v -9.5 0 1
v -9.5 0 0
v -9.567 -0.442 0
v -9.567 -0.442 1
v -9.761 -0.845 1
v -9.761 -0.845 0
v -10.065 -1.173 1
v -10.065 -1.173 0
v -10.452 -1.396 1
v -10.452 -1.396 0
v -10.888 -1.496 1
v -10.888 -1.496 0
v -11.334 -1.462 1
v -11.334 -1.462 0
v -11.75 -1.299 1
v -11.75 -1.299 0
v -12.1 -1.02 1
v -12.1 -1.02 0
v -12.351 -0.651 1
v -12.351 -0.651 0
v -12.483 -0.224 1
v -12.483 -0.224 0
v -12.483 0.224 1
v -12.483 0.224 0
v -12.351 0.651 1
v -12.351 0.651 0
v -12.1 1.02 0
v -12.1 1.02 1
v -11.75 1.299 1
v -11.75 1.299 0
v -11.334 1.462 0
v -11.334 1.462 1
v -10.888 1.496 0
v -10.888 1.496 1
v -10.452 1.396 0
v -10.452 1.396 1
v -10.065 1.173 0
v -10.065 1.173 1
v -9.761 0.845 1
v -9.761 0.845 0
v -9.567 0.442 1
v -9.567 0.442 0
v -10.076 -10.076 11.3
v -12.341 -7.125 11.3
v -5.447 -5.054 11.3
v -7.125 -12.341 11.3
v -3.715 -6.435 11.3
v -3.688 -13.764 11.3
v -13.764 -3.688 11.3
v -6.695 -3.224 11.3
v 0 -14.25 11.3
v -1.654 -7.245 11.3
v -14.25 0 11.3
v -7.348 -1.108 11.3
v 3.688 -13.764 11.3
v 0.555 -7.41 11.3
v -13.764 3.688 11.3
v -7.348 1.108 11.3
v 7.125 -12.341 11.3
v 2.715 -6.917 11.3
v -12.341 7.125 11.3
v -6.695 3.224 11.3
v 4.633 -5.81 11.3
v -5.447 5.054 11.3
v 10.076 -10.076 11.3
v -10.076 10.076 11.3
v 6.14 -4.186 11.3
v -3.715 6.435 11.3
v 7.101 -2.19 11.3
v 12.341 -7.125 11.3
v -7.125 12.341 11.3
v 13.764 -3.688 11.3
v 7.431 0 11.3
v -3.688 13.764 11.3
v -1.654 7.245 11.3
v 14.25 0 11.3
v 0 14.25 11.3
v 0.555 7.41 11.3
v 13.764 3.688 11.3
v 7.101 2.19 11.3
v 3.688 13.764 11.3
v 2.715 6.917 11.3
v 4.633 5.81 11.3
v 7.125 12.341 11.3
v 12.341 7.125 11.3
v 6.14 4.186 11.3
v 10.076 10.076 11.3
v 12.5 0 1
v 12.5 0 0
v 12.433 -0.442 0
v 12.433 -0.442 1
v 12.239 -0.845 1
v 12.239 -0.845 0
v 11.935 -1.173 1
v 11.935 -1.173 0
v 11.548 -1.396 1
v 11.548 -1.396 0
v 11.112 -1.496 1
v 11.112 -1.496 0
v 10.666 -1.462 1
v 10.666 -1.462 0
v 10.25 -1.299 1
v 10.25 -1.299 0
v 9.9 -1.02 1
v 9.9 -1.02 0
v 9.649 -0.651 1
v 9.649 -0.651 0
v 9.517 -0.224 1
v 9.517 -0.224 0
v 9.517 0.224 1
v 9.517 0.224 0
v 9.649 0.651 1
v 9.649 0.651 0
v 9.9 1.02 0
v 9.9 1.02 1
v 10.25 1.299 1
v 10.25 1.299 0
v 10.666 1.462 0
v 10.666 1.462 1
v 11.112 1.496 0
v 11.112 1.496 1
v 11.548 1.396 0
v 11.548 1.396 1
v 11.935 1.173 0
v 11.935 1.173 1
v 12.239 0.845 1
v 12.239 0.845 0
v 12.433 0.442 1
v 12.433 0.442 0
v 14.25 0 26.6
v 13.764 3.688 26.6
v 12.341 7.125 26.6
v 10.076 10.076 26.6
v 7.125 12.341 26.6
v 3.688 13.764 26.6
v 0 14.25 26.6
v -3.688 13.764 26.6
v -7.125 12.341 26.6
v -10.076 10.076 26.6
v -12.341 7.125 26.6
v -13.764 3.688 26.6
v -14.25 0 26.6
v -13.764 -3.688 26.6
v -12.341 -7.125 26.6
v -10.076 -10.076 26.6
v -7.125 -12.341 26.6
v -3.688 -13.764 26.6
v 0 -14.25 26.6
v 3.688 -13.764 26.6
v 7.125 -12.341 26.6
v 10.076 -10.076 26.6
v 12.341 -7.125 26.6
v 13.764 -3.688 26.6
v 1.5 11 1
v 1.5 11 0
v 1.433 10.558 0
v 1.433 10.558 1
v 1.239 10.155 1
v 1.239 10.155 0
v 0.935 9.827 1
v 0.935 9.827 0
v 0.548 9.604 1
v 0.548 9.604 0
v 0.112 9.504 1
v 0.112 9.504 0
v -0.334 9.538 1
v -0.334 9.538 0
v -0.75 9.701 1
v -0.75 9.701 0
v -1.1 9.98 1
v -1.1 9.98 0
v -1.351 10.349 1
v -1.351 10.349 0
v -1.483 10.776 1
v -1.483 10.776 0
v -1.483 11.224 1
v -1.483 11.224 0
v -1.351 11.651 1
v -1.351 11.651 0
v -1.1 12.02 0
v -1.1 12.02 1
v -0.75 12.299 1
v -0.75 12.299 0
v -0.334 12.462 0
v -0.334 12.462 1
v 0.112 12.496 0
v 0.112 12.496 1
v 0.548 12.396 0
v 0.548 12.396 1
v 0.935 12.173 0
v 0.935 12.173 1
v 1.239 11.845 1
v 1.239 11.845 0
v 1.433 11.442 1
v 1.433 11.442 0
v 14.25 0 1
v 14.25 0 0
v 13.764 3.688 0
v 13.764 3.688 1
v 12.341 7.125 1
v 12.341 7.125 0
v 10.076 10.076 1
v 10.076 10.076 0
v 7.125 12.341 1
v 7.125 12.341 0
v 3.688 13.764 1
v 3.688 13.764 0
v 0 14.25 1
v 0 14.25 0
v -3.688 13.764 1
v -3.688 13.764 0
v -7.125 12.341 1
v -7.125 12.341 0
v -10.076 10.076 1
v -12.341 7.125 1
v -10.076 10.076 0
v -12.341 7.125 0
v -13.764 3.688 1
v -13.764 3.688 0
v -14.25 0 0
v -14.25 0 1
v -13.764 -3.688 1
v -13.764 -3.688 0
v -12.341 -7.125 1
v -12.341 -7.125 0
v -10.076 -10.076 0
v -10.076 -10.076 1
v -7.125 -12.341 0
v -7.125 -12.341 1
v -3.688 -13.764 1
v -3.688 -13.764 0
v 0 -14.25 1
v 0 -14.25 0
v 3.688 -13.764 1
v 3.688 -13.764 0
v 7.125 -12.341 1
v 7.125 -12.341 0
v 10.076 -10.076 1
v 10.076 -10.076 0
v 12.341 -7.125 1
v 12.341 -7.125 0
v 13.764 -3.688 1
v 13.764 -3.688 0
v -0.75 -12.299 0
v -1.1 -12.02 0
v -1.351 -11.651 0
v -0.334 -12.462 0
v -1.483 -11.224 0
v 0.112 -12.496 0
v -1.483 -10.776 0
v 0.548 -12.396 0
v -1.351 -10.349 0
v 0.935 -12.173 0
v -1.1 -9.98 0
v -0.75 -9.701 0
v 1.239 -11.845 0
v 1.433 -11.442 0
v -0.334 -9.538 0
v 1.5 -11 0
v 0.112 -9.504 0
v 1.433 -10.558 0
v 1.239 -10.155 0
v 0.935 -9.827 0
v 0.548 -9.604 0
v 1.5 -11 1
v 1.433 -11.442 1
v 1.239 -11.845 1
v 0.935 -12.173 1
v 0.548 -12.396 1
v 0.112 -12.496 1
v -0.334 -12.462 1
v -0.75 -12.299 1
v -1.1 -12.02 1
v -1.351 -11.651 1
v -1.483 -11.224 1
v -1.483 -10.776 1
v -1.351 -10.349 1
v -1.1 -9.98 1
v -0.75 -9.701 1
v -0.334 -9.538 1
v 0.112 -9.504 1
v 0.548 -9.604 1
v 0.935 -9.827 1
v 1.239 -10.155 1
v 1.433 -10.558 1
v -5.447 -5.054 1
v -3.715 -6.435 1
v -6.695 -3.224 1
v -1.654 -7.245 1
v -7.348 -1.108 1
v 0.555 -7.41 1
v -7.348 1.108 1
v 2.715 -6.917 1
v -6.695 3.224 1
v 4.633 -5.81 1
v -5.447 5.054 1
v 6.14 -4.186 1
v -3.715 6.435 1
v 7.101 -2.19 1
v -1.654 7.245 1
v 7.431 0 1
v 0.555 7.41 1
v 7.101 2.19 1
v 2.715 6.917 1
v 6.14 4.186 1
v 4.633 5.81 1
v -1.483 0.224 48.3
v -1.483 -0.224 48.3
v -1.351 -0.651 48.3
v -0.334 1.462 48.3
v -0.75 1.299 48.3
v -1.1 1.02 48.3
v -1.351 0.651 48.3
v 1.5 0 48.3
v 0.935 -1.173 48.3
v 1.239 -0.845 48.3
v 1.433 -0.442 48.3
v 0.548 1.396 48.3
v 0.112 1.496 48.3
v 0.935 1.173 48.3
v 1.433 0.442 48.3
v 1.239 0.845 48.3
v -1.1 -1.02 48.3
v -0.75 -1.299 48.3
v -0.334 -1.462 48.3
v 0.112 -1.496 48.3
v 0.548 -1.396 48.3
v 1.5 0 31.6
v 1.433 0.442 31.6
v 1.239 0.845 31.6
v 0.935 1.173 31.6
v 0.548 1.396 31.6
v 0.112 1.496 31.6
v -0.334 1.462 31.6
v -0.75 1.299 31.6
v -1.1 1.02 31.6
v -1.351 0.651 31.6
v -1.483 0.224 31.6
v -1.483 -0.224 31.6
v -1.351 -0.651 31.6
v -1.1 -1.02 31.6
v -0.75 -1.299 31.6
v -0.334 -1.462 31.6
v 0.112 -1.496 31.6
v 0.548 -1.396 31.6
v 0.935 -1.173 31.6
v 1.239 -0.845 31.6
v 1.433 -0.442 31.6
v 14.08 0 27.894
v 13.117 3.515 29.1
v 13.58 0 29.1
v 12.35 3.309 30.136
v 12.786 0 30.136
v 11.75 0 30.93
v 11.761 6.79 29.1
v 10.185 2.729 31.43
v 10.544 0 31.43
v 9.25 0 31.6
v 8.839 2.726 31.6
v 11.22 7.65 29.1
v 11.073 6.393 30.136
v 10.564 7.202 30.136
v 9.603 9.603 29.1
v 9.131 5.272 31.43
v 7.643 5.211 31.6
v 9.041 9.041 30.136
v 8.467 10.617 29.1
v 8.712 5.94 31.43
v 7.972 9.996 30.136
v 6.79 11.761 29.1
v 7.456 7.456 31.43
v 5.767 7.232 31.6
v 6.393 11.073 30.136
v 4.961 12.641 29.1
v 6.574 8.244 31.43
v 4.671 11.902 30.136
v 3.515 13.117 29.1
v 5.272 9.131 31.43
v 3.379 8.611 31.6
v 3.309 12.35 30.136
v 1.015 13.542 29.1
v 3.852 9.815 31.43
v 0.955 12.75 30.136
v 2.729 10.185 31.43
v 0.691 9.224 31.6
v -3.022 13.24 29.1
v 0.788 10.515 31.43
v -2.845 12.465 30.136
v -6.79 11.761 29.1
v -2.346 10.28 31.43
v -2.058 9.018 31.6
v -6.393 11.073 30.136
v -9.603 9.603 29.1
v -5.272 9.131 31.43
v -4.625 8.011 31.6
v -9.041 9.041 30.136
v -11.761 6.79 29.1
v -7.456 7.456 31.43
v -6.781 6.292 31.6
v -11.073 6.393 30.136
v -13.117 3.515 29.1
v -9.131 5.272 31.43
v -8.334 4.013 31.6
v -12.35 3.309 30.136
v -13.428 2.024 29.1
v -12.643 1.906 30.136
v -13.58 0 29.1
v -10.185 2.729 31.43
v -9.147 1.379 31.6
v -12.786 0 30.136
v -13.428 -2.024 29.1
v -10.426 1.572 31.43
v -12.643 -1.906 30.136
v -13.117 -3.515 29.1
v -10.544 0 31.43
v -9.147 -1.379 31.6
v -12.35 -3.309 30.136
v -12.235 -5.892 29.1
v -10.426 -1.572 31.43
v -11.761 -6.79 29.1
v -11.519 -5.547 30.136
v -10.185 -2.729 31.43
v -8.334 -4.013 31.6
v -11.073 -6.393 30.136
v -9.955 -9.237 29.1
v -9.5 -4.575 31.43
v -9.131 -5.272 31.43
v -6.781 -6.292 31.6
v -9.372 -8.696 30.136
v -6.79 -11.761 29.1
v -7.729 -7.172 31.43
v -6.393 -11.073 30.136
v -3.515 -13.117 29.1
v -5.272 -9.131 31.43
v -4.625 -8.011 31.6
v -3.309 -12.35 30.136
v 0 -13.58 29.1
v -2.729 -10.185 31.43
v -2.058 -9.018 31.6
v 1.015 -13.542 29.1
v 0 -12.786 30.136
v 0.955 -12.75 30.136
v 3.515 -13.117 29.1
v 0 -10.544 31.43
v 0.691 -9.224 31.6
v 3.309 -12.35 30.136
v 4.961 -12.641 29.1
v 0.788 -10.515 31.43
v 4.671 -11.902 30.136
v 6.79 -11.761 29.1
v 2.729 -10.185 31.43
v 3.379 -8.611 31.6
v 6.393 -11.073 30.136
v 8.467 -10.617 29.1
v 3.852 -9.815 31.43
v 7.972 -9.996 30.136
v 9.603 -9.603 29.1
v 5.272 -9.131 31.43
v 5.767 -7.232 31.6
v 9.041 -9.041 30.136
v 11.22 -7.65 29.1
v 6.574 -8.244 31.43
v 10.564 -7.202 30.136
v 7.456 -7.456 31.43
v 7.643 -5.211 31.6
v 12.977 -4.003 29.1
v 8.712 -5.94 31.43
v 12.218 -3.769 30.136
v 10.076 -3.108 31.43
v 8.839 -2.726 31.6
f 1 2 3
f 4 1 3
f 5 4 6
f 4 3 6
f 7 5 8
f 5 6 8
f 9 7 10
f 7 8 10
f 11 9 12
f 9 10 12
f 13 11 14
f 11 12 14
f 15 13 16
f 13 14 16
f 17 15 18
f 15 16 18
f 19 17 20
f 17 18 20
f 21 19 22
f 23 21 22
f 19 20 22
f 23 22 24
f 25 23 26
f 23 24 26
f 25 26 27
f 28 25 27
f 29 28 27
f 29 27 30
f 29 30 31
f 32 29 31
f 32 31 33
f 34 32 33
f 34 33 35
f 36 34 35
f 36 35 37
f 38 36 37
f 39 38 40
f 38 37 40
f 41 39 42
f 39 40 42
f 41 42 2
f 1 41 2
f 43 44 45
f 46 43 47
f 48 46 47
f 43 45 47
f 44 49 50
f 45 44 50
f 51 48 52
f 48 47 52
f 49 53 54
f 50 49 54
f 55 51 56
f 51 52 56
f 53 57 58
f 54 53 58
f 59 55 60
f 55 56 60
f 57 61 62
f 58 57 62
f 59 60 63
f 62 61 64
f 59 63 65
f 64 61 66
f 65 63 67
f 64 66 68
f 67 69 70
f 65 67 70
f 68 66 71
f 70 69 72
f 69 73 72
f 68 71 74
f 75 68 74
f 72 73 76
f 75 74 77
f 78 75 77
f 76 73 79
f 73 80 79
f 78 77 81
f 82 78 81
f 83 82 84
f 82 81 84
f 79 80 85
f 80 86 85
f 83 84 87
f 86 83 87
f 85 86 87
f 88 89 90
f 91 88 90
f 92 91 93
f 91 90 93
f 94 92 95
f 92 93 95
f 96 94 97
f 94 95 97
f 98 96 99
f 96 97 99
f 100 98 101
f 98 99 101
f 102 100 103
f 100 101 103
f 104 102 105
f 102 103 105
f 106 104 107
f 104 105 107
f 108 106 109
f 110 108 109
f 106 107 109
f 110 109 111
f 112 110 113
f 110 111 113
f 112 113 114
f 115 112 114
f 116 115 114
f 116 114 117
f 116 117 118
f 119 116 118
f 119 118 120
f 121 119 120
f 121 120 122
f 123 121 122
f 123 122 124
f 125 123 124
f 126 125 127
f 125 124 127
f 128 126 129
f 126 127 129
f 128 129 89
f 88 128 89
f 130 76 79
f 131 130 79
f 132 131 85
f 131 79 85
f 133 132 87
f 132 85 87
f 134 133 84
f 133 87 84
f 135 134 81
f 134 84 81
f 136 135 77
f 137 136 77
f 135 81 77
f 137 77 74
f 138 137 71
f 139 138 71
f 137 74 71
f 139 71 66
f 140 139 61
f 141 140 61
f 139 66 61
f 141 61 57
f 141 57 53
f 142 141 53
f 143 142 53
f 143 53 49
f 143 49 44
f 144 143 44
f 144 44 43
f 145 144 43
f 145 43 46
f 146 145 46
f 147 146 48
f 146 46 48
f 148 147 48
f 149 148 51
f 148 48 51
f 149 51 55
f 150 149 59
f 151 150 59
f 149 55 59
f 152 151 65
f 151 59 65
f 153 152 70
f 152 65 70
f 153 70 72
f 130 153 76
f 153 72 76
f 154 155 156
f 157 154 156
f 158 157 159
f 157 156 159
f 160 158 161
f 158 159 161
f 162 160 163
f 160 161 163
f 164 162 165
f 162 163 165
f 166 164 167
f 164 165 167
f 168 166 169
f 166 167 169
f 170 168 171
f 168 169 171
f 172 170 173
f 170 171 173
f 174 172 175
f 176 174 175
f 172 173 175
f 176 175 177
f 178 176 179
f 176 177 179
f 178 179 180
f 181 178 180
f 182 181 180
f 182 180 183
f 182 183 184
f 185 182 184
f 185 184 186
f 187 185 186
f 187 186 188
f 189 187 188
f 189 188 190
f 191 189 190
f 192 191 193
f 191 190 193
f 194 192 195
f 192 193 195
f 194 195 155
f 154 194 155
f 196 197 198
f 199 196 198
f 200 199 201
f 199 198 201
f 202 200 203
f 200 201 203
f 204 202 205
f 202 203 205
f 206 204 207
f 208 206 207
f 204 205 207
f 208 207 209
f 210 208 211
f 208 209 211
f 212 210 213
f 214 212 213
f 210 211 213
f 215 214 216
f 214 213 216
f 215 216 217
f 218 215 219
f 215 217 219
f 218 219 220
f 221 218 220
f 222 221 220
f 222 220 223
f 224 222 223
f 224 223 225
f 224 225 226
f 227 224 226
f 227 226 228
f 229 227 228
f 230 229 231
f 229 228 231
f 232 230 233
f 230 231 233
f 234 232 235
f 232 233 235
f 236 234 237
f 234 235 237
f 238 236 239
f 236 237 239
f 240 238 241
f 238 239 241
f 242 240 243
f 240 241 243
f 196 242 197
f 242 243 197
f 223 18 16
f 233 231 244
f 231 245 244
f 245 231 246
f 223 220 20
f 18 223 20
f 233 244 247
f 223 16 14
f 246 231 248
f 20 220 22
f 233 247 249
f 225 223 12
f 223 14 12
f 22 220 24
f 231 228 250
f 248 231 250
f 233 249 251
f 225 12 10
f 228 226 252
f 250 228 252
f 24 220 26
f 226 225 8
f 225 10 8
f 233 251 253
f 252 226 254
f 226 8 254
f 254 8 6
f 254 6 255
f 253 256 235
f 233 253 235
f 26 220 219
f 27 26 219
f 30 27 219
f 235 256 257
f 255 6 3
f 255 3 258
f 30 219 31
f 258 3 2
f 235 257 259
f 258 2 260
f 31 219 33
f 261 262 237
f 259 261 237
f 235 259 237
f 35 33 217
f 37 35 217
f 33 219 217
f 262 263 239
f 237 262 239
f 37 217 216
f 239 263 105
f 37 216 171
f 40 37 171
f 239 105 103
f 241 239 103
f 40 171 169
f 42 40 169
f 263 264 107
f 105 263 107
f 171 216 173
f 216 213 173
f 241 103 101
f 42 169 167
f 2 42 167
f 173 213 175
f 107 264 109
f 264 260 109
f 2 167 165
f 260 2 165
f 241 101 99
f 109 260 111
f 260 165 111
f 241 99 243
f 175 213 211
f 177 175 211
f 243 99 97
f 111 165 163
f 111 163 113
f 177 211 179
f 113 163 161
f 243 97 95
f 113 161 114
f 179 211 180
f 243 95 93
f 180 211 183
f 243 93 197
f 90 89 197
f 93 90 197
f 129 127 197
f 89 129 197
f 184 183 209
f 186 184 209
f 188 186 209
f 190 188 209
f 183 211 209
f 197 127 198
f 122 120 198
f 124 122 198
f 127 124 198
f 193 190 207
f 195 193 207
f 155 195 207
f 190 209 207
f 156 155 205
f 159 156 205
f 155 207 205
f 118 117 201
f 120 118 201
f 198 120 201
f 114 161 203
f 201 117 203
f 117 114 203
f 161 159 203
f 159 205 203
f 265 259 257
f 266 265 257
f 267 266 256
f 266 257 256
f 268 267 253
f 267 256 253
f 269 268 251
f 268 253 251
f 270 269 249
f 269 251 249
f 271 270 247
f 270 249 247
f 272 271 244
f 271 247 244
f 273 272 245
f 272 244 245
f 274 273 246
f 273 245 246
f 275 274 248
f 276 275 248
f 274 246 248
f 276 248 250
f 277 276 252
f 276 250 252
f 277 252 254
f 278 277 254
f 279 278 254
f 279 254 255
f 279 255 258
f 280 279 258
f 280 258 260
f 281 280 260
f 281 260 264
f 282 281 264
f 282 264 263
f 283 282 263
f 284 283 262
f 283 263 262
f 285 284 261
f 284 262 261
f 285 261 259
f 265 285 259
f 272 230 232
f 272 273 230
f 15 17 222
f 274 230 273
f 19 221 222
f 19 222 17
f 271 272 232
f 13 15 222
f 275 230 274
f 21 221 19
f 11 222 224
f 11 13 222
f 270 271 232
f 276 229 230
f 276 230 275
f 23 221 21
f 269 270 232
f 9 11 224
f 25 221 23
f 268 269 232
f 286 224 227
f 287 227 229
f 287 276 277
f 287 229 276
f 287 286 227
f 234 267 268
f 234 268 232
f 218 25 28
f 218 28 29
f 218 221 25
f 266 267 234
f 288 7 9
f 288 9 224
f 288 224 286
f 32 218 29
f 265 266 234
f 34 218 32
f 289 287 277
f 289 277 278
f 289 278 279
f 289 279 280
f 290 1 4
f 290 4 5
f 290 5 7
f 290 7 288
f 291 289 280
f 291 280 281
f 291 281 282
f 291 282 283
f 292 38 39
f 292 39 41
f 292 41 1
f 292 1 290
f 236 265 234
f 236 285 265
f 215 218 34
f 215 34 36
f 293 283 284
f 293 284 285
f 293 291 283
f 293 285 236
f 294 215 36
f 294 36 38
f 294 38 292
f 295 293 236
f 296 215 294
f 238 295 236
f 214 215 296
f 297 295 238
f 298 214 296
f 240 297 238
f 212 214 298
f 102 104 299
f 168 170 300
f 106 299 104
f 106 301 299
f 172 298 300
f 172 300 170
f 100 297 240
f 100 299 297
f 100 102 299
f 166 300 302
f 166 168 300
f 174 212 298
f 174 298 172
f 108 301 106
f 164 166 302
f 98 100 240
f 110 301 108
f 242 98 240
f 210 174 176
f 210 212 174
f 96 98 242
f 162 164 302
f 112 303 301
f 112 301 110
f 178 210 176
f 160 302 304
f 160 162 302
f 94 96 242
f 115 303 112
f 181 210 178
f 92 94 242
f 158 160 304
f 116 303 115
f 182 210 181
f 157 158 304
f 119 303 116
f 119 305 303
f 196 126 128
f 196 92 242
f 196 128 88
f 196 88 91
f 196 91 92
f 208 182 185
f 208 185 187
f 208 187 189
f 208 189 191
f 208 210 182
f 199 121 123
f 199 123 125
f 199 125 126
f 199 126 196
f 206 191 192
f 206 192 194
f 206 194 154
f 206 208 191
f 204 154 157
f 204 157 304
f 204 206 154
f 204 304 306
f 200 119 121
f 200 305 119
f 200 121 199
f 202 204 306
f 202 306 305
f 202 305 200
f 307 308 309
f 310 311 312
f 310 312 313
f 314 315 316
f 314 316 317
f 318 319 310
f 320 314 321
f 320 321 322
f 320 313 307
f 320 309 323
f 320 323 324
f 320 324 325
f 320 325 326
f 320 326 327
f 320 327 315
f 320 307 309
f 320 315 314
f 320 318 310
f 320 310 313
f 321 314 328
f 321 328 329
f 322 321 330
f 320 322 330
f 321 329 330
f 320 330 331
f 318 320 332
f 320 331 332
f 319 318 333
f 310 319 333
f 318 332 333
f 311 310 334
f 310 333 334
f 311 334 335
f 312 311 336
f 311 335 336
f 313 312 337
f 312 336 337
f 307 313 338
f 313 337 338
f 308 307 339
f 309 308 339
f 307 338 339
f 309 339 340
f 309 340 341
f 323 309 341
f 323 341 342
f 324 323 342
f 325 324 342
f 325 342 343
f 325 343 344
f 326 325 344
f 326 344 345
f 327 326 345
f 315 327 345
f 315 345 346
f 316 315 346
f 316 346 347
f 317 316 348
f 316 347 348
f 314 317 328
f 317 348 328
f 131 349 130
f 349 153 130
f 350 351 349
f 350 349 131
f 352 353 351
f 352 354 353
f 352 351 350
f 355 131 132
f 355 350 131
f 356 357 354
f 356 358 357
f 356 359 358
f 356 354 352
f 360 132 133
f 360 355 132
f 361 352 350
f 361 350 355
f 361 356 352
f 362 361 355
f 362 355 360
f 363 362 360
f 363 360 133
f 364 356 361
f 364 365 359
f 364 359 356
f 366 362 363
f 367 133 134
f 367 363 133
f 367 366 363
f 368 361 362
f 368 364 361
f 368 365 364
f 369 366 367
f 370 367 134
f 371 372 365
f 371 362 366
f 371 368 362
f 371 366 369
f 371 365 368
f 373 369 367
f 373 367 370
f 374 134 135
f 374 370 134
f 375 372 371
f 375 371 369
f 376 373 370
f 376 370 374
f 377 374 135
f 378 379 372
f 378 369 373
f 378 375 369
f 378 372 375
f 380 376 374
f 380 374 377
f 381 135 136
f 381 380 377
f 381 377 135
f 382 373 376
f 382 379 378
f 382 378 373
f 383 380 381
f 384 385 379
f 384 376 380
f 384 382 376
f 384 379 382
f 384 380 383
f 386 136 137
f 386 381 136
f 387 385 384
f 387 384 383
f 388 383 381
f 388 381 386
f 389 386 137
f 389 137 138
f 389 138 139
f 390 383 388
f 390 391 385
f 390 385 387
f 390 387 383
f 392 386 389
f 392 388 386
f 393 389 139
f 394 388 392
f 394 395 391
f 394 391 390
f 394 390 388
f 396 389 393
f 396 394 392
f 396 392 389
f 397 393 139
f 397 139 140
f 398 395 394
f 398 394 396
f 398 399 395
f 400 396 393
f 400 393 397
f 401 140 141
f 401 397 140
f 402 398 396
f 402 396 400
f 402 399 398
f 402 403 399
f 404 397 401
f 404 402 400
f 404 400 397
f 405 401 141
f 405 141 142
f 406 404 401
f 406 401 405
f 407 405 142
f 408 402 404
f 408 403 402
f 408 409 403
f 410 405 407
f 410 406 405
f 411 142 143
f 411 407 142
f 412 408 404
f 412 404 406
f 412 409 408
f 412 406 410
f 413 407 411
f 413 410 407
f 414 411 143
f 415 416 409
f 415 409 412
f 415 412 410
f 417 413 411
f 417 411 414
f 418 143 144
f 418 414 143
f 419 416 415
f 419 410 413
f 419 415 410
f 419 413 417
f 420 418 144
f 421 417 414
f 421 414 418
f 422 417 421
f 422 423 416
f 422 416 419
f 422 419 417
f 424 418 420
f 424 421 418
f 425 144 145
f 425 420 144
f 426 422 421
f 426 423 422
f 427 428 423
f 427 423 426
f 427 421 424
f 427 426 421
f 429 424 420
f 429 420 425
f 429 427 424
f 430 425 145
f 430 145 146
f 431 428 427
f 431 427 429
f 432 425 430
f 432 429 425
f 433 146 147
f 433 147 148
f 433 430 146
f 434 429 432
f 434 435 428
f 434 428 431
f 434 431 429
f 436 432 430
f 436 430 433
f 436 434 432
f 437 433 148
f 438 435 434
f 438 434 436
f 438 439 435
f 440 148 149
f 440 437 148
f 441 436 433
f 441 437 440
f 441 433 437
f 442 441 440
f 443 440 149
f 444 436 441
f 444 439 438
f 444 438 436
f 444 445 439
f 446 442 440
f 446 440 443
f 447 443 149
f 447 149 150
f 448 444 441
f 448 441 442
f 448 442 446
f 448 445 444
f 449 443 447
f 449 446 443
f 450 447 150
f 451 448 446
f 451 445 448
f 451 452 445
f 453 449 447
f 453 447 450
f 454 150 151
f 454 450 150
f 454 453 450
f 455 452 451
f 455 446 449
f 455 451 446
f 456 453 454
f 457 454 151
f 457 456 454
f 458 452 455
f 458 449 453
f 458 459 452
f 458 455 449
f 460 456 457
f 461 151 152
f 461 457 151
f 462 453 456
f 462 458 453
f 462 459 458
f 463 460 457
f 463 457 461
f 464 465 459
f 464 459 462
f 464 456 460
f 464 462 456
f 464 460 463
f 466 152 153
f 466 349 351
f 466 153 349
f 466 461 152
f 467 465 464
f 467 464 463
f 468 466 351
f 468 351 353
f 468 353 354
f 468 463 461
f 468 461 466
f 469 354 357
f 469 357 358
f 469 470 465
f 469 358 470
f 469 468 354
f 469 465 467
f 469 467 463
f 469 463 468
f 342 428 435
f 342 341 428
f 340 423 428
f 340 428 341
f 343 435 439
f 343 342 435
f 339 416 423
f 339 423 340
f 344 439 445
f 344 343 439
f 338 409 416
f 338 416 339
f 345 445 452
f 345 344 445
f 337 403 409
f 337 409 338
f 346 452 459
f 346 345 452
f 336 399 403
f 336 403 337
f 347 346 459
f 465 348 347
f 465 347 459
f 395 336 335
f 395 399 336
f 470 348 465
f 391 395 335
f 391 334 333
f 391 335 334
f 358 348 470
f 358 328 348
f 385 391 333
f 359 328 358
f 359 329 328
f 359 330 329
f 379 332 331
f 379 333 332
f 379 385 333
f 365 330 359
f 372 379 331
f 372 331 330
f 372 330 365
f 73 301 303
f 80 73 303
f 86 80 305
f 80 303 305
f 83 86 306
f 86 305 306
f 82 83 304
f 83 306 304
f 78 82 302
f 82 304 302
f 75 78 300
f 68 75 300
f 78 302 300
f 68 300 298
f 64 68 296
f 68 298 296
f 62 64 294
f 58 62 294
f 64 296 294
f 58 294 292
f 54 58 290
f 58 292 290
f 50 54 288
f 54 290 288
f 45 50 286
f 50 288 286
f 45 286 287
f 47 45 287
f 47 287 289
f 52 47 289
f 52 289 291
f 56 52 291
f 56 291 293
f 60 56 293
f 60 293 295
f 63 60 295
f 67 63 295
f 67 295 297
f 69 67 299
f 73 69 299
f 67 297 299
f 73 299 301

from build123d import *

# Parameters (mm, degrees)
F0_R      = 14.25
F1_DEPTH  = 1
F2_R      = 7.430853
F3_DEPTH  = 10.3
F4_R      = 14.25
F5_DEPTH  = 20.3
F6_R      = 5
F7_R      = 1.5
F8_DEPTH  = 16.7
F9_R      = 1.5
F10_DEPTH = 1


with BuildPart() as f1:
    # F0 (on Top) → F1 (new body)
    with BuildSketch(Plane.XY):
        Circle(F0_R)
    extrude(amount=F1_DEPTH)

    # F2 (on face) → F3 (join)
    with BuildSketch(Plane.XY.offset(1)):
        Circle(F2_R)
    extrude(amount=F3_DEPTH)

    # F4 (on face) → F5 (join)
    with BuildSketch(Plane.XY.offset(11.3)):
        Circle(F4_R)
    extrude(amount=F5_DEPTH)

    # F6
    f6_edges = [f1.edges().sort_by_distance(p)[0] for p in [
        (-14.25, 0, 31.6),
    ]]
    fillet(f6_edges, radius=F6_R)

    # F7 (on face) → F8 (join)
    with BuildSketch(Plane.XY.offset(31.6)):
        Circle(F7_R)
    extrude(amount=F8_DEPTH)

    # F9 (on face) → F10 (cut, through all)
    with BuildSketch(Plane(origin=(0, 0, 0), x_dir=(1, 0, 0), z_dir=(0, 0, -1))):
        with Locations((0, 11)):
            Circle(F9_R)
        with Locations((11, 0)):
            Circle(F9_R)
        with Locations((-11, 0)):
            Circle(F9_R)
        with Locations((0, -11)):
            Circle(F9_R)
    extrude(amount=-F10_DEPTH, mode=Mode.SUBTRACT)


solid = f1.part
